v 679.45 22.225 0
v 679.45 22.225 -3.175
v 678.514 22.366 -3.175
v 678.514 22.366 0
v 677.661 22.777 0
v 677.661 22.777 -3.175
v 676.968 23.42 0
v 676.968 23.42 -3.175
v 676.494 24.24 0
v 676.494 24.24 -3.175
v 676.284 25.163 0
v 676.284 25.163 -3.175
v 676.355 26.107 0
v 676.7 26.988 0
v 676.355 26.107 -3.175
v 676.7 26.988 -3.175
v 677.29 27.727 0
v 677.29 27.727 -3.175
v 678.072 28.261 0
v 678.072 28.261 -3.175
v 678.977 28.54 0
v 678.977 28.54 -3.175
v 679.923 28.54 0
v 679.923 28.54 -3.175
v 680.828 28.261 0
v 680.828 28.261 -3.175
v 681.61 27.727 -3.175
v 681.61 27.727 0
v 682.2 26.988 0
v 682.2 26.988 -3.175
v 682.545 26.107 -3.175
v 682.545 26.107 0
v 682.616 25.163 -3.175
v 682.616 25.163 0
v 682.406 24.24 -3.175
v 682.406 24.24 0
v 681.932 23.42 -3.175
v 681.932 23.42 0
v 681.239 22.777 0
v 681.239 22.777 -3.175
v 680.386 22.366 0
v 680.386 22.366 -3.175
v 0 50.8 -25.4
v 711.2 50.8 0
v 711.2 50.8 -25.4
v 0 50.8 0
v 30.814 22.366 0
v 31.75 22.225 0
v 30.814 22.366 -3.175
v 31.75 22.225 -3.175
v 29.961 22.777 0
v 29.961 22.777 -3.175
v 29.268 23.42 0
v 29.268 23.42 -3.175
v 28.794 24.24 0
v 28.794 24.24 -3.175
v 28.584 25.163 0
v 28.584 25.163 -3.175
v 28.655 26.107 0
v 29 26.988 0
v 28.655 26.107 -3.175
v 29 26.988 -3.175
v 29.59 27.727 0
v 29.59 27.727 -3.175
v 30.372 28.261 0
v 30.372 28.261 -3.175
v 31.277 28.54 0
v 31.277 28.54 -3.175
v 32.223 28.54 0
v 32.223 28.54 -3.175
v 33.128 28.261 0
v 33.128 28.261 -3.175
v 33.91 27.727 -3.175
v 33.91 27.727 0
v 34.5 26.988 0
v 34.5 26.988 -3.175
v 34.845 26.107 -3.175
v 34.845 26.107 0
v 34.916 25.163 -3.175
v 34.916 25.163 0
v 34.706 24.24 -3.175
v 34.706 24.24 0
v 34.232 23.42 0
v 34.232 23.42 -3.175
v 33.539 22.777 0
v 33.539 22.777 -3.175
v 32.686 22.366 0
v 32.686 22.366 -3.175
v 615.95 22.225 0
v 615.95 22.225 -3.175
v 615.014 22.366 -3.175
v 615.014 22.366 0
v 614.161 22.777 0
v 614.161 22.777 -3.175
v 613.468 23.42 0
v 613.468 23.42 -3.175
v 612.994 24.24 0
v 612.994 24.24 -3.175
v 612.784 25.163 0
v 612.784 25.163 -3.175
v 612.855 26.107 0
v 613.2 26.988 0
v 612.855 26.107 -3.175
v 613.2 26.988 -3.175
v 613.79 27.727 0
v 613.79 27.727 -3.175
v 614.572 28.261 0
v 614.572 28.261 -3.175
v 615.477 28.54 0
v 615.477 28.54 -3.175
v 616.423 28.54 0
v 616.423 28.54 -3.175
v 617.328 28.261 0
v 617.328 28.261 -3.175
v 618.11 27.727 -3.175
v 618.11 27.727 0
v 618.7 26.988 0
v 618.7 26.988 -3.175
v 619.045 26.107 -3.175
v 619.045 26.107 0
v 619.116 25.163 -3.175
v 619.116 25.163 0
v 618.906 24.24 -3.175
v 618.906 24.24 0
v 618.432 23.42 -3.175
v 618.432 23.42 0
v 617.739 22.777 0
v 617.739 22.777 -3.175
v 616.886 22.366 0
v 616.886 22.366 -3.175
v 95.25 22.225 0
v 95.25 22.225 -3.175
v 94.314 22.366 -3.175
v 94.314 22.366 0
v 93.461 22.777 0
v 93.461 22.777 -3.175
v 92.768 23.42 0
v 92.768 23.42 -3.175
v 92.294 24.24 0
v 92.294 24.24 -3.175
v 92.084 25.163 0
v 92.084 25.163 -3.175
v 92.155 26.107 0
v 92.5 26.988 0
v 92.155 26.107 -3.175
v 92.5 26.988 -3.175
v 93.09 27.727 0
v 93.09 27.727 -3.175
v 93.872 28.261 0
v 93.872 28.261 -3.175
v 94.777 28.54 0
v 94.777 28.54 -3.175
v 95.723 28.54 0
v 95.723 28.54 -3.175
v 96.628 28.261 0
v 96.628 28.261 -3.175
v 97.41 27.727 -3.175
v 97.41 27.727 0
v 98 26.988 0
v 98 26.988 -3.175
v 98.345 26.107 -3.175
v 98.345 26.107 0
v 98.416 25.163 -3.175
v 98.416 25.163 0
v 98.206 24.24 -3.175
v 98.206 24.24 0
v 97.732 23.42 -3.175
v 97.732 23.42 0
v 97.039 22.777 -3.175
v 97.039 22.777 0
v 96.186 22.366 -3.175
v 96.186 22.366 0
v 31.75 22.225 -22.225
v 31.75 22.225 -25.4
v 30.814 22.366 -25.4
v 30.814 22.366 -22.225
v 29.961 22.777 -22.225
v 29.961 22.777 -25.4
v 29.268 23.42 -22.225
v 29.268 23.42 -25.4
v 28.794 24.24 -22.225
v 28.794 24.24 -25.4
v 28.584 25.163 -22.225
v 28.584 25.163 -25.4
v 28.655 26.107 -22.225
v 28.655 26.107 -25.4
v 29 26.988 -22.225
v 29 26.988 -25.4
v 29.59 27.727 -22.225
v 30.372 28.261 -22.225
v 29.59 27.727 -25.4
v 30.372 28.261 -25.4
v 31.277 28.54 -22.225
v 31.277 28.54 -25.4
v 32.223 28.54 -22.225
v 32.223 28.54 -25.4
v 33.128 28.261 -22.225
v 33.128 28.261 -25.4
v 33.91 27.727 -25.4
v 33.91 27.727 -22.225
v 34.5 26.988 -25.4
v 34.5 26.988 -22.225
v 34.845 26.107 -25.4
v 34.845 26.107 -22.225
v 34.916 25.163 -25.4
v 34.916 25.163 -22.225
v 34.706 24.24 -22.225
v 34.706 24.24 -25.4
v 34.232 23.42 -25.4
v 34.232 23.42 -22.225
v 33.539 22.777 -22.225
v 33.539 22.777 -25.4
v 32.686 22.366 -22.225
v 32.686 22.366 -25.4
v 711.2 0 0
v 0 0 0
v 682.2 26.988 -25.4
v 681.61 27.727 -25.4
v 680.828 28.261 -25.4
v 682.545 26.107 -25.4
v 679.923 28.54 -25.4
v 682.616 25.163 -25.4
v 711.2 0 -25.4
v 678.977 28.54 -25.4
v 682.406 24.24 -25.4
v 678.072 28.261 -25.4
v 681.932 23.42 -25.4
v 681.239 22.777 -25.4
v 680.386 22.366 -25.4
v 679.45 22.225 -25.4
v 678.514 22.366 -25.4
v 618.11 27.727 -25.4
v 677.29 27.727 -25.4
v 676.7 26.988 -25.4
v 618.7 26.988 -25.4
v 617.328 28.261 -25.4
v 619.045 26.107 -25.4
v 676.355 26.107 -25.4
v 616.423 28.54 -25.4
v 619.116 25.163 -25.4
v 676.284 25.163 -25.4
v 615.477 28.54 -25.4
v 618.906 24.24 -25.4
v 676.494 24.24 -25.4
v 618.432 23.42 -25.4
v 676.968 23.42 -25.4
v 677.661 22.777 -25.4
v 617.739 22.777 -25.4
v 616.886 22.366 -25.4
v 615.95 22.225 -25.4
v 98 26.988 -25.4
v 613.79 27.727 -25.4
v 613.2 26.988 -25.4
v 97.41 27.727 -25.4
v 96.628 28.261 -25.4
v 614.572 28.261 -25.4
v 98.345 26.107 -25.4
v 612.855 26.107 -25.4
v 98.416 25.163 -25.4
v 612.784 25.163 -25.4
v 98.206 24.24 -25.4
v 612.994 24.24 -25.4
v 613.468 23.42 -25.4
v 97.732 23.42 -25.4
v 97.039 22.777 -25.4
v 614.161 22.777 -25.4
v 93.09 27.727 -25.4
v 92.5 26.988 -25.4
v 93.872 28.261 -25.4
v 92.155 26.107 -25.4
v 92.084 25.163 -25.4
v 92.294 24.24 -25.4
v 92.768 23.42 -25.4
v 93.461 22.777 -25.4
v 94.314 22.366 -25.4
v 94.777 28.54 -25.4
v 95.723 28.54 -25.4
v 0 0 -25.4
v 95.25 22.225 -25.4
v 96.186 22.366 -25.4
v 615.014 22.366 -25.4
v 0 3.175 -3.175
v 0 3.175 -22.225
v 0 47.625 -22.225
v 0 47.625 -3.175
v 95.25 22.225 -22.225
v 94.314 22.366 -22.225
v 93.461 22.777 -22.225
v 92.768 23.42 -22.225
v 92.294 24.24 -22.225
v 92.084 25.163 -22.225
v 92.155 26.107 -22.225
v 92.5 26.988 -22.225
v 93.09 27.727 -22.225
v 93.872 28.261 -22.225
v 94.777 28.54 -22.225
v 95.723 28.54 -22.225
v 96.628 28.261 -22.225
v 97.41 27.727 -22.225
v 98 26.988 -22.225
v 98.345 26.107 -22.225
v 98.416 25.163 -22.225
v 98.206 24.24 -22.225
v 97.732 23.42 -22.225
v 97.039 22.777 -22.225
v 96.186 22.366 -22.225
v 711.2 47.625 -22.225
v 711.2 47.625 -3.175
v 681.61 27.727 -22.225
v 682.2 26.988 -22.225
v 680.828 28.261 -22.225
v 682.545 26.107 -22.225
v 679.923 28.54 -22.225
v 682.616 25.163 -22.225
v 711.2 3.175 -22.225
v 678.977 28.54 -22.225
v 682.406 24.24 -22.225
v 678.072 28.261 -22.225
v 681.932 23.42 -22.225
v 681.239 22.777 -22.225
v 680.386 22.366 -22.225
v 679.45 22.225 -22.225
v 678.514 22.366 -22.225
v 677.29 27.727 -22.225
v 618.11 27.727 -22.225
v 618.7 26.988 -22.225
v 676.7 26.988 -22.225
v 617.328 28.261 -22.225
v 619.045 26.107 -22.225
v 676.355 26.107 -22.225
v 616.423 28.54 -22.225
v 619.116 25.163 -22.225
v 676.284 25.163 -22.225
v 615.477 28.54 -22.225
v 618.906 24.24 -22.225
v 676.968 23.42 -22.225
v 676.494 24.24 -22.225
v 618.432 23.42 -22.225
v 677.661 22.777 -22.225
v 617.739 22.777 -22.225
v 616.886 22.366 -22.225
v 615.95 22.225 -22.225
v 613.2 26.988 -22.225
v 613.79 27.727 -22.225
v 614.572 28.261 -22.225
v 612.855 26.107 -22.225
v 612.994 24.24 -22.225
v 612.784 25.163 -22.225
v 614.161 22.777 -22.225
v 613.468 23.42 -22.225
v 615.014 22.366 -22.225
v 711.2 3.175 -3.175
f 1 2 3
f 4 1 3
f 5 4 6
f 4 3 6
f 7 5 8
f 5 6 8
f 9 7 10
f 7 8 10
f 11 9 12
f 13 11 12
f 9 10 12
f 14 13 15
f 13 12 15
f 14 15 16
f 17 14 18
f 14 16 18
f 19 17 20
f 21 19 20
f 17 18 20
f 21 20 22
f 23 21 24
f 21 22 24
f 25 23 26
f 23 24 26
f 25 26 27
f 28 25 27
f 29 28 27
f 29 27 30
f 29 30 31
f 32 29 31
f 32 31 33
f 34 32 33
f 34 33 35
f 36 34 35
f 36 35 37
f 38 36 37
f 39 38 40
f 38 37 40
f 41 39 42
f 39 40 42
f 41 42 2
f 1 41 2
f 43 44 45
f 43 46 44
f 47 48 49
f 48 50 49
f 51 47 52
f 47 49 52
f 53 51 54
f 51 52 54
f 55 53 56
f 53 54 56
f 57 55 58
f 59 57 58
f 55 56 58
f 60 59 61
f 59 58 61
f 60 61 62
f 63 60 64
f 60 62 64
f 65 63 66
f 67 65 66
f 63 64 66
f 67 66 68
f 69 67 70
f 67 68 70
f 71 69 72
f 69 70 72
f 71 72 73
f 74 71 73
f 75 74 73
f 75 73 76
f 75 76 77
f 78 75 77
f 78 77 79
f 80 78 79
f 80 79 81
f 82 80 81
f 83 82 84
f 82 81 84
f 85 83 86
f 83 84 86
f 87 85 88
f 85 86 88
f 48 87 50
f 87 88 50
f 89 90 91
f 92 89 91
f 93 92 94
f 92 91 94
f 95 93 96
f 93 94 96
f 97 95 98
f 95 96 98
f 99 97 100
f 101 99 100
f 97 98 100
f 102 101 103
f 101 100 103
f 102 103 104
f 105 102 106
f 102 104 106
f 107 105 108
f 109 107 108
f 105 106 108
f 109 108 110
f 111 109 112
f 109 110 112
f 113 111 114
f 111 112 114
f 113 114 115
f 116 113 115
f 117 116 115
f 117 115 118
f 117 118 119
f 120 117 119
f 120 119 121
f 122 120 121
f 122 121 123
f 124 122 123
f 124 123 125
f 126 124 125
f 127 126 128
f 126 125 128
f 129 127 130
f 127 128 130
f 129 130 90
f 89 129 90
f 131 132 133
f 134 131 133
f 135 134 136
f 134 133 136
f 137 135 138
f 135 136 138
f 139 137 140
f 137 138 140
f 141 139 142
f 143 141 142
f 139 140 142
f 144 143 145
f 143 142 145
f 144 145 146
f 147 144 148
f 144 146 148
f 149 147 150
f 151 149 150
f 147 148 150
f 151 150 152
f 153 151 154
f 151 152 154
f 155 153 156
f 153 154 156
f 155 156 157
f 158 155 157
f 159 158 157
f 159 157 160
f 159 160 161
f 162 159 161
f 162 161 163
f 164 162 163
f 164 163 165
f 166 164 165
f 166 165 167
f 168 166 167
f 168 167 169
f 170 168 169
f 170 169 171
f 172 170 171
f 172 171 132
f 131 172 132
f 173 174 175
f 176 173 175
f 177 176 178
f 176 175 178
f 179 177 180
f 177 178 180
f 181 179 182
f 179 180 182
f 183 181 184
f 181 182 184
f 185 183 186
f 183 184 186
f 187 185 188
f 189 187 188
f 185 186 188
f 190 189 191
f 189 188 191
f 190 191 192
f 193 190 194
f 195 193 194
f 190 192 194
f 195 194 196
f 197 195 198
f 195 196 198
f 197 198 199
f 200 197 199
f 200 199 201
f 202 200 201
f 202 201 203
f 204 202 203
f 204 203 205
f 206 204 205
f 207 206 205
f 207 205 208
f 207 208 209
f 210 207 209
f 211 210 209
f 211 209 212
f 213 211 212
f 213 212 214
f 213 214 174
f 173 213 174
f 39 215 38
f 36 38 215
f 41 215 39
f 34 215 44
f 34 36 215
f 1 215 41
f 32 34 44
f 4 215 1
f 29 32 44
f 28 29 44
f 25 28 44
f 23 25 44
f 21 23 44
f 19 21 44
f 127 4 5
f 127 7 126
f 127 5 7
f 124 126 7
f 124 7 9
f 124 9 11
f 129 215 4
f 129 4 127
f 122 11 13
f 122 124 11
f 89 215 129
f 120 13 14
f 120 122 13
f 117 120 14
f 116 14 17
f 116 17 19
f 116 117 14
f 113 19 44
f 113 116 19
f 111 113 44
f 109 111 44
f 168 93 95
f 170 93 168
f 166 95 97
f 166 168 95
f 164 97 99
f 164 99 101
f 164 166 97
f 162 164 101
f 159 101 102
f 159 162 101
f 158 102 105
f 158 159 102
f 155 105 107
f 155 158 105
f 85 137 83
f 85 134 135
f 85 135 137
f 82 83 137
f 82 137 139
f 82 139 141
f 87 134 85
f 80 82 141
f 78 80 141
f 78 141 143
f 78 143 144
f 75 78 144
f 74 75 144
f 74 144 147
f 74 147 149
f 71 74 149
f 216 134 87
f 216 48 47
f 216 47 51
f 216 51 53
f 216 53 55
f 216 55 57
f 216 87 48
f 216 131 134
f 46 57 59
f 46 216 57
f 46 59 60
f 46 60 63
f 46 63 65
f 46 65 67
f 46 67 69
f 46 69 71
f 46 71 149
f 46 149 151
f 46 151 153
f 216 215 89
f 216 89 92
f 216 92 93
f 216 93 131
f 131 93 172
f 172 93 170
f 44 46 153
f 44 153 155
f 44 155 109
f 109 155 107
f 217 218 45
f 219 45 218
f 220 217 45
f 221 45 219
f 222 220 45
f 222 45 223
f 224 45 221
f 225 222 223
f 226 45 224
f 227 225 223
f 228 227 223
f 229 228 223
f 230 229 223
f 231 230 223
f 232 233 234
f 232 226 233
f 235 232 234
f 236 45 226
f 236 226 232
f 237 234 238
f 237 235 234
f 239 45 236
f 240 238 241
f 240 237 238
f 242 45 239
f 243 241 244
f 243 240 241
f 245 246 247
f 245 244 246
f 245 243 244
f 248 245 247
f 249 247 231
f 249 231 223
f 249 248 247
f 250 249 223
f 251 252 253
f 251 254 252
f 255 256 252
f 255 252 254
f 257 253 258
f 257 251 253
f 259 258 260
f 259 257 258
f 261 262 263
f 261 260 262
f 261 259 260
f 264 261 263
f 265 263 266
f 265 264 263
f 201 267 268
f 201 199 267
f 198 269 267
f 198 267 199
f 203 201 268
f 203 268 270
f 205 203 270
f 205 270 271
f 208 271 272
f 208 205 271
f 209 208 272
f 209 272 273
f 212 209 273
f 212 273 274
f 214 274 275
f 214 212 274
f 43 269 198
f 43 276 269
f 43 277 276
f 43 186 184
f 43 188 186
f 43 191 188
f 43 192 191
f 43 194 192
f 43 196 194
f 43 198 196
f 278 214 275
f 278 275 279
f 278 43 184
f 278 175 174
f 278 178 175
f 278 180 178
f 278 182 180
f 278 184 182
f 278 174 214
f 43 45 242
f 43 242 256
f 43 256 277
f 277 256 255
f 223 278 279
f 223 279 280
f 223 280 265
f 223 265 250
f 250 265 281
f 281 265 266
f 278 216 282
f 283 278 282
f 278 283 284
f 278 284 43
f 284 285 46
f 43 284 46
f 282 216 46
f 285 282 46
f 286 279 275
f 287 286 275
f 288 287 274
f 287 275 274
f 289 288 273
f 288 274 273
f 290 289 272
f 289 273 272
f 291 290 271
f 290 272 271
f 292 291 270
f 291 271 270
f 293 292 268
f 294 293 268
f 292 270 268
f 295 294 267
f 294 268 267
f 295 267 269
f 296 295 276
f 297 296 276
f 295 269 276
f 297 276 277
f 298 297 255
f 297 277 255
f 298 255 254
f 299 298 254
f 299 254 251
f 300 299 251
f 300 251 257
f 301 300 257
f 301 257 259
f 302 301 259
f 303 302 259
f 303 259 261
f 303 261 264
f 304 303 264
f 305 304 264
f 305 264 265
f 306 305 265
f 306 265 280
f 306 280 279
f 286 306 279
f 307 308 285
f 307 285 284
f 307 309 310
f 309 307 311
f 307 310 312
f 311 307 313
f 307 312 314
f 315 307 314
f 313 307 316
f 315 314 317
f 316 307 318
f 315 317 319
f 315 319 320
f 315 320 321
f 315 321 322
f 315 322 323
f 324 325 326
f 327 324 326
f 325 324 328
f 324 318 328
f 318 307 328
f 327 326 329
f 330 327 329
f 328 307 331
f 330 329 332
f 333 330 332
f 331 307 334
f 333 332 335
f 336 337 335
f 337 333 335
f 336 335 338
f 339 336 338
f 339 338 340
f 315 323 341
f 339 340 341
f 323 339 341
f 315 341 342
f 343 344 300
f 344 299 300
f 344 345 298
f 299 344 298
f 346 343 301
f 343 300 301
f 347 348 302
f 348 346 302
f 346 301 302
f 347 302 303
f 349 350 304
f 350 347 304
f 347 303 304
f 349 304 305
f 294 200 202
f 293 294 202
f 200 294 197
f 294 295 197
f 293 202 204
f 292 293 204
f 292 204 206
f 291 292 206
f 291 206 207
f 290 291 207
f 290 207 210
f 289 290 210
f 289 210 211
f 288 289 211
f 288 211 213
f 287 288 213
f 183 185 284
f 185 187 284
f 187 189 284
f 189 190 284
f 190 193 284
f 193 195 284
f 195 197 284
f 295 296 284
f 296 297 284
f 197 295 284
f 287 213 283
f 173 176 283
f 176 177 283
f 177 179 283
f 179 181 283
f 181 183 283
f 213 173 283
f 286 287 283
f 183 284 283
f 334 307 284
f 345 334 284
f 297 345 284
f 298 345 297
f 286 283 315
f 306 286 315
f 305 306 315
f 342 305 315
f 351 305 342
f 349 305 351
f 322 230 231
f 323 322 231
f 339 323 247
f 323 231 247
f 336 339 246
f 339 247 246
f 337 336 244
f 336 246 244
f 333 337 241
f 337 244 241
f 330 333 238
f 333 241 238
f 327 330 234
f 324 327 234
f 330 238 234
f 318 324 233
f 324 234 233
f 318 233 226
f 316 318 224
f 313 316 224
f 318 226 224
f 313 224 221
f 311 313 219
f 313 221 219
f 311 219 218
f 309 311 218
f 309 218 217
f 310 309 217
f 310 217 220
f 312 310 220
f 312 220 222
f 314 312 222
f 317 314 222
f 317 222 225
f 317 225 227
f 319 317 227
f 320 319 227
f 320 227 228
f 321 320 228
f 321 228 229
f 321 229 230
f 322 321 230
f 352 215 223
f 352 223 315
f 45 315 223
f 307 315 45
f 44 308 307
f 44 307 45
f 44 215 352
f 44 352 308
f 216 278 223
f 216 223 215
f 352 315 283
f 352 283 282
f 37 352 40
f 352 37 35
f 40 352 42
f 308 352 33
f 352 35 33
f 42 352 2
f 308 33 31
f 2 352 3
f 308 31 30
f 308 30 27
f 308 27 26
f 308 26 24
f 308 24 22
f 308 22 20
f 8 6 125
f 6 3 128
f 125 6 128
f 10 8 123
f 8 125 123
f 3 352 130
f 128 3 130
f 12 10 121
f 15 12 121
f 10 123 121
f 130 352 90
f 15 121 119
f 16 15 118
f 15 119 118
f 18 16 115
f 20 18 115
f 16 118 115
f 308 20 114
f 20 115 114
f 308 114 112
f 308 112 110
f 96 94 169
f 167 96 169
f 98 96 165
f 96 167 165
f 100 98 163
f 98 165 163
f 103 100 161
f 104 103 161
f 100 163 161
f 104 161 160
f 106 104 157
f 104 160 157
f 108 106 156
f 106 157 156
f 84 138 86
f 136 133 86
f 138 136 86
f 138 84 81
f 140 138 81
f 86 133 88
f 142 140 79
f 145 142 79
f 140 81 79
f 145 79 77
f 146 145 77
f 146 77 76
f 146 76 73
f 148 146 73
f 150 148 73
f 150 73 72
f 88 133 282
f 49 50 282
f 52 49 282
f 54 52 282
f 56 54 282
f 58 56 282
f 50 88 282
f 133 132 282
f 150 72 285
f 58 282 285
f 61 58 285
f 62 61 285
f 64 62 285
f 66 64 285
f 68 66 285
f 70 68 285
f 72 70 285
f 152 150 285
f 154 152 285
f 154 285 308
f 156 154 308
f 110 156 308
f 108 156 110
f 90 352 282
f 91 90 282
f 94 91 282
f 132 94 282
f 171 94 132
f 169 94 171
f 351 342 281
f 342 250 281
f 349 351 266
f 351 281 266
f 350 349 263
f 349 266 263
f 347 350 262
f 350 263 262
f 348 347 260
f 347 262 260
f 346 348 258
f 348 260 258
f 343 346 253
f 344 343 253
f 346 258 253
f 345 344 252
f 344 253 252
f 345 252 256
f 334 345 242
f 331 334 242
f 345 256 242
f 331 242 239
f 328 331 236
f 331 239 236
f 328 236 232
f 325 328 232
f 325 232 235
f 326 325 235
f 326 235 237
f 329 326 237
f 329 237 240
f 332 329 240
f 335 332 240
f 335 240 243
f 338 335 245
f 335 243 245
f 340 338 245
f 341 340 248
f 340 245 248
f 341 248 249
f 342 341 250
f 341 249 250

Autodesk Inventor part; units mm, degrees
ref_plane "YZ Plane" through (0, 0, 0) normal (1, 0, 0) x (0, 1, 0)
ref_plane "XZ Plane" through (0, 0, 0) normal (0, 1, 0) x (-1, 0, 0)
ref_plane "XY Plane" through (0, 0, 0) normal (0, 0, 1) x (1, 0, 0)
sketch "Sketch1" plane through (0, 0, 0) normal (1, 0, 0) x (0, 1, 0)
  line L0 (0, 0) -> (50.8, 0)
  line L1 (50.8, 0) -> (50.8, -25.4)
  line L2 (50.8, -25.4) -> (0, -25.4)
  line L3 (0, -25.4) -> (0, 0)
  line L4 (3.175, -3.175) -> (47.625, -3.175)
  line L5 (47.625, -3.175) -> (47.625, -22.225)
  line L6 (47.625, -22.225) -> (3.175, -22.225)
  line L7 (3.175, -22.225) -> (3.175, -3.175)
  dimension "d0" = 50.8
  dimension "d1" = 25.4
  dimension "d2" = 44.45
  dimension "d3" = 19.05
  dimension "d4" = 3.175
  dimension "d5" = 3.175
extrude "Extrusion1" add sketch "Sketch1" along normal blind 711.2
sketch "Sketch2" plane through (0, 0, 0) normal (0, 0, 1) x (1, 0, 0)
  line L0 (0, 0) -> (0, 50.8) projected
  line L1 (0, 0) -> (711.2, 0) projected
  line L2 (711.2, 50.8) -> (711.2, 0) projected
  line L3 (0, 50.8) -> (711.2, 50.8) projected
  point P0 (31.75, 25.4)
  point P1 (679.45, 25.4)
  dimension "d8" = 31.75
  dimension "d9" = 25.4
  dimension "d10" = 31.75
  dimension "d11" = 25.4
hole "Hole3" at (31.75, 25.4, 0) at (679.45, 25.4, 0) direction (0, 0, -1) diameter 6.35 end through all
sketch "Sketch3" plane through (0, 0, 0) normal (0, 0, 1) x (1, 0, 0)
  circle A0 centre (31.75, 25.4) radius 3.175 projected
  circle A1 centre (679.45, 25.4) radius 3.175 projected
  line L0 (0, 0) -> (0, 50.8) projected
  line L1 (0, 0) -> (711.2, 0) projected
  line L2 (711.2, 50.8) -> (711.2, 0) projected
  line L3 (0, 50.8) -> (711.2, 50.8) projected
  point P0 (95.25, 25.4)
  point P1 (615.95, 25.4)
  dimension "d37" = 95.25
  dimension "d38" = 25.4
  dimension "d39" = 25.4
  dimension "d40" = 95.25
hole "Hole4" at (95.25, 25.4, 0) at (615.95, 25.4, 0) direction (0, 0, -1) diameter 6.35 end through all
properties part number "frame_wide"
